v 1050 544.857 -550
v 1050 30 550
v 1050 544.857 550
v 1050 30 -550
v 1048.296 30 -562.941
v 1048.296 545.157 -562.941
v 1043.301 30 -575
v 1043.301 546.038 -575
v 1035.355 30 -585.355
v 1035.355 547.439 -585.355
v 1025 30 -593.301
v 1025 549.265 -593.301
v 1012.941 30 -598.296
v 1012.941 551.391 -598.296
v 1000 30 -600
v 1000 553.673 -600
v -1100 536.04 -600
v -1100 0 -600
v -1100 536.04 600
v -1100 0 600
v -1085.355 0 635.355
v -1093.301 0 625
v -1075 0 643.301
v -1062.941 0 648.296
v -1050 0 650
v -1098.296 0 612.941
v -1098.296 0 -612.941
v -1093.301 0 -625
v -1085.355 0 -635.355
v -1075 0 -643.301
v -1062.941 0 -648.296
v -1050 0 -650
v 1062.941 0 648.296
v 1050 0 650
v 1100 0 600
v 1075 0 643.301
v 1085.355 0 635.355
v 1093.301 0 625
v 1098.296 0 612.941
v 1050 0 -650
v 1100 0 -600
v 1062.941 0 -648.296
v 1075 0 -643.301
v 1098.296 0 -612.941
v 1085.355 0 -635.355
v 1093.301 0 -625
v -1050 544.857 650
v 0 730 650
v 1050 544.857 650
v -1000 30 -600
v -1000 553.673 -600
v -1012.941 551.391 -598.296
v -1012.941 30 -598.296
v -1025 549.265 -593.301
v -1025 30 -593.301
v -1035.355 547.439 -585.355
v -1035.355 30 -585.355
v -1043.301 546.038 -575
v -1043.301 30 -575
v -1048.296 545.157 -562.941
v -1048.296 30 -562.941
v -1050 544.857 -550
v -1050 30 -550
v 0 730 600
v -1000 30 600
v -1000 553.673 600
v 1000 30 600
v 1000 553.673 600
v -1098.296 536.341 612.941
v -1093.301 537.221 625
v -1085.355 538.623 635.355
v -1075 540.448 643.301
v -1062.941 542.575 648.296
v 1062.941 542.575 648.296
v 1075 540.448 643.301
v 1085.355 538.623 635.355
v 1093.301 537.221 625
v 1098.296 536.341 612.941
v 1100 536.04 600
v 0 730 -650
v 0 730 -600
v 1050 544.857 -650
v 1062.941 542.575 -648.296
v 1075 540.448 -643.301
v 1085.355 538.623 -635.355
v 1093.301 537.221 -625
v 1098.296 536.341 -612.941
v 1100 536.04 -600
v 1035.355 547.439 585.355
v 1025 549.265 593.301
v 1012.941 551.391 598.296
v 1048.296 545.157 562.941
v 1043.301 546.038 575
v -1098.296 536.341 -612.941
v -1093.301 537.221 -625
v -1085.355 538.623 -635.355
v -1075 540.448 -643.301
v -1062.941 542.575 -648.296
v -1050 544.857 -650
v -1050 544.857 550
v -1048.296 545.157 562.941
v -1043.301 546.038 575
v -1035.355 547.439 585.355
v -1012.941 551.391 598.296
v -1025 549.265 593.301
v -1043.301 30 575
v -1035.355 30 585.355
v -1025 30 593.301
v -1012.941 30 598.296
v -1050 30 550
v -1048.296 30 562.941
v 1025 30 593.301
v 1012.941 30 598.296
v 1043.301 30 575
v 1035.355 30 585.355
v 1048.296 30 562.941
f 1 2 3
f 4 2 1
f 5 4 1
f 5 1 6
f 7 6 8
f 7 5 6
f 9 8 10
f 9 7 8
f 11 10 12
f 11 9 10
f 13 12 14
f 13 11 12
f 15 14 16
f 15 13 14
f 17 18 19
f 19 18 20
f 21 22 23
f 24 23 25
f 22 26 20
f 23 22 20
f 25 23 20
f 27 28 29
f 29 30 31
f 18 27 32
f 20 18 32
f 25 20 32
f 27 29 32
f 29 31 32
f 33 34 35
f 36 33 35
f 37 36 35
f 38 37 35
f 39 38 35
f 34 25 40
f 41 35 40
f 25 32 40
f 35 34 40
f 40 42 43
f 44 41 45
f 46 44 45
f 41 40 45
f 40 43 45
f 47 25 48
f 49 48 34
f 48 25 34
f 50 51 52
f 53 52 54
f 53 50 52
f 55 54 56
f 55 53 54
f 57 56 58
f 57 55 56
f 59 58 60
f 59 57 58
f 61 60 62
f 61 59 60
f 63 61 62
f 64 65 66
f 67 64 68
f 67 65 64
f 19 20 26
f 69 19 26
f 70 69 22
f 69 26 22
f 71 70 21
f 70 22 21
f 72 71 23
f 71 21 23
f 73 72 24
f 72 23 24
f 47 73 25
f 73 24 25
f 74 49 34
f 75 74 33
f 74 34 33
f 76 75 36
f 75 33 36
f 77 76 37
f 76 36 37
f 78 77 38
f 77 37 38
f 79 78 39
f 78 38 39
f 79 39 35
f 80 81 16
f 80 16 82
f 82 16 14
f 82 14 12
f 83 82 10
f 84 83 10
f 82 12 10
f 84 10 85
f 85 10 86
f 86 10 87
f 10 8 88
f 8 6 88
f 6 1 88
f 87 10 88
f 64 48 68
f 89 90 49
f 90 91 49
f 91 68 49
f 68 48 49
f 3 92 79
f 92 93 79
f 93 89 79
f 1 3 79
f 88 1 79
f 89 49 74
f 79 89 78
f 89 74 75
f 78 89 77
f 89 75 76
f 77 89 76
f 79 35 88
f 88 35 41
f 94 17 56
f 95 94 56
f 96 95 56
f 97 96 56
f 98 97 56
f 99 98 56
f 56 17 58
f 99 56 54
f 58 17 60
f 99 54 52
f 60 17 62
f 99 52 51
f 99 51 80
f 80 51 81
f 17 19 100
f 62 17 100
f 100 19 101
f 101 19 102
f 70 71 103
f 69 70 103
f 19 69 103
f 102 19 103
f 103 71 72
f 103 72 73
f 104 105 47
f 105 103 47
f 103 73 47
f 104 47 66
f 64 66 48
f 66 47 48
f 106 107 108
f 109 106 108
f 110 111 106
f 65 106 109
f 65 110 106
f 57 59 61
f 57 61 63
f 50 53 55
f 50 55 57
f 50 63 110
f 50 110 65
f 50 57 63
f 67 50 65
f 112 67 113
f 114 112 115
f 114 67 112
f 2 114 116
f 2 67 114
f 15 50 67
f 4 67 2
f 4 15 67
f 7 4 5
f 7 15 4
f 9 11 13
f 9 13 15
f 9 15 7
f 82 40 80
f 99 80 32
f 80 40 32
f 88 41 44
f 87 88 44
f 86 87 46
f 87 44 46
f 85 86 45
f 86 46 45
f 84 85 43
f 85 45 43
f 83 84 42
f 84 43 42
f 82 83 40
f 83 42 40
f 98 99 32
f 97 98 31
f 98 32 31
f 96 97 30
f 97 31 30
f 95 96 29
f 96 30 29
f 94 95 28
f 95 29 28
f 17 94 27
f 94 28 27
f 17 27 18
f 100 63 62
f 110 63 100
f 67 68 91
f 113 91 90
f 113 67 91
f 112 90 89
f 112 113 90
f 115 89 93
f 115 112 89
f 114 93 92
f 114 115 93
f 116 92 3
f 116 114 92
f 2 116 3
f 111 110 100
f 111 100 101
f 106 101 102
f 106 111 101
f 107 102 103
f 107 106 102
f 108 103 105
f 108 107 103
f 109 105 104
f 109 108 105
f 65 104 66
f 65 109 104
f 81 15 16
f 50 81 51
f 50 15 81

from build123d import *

# Parameters (mm, degrees)
EXTRUDE_1_DEPTH     = 30
EXTRUDE_2_DEPTH     = 700
CUT_EXTRUDE_1_REACH = 1854.809


with BuildPart() as part:
    # Эскиз1 → Бобышка-Вытянуть1 (new body)
    with BuildSketch(Plane(origin=(0, 0, 0), x_dir=(1, 0, 0), z_dir=(0, 1, 0))):
        with BuildLine():
            Line((-1050, -650), (1050, -650))
            ThreePointArc((1050, -650), (1085.355339059, -635.355339059), (1100, -600))
            Line((1100, -600), (1100, 600))
            ThreePointArc((1100, 600), (1085.355339059, 635.355339059), (1050, 650))
            Line((1050, 650), (-1050, 650))
            ThreePointArc((-1050, 650), (-1085.355339059, 635.355339059), (-1100, 600))
            Line((-1100, 600), (-1100, -600))
            ThreePointArc((-1100, -600), (-1085.355339059, -635.355339059), (-1050, -650))
        make_face()
    extrude(amount=EXTRUDE_1_DEPTH)

    # Эскиз2 → Бобышка-Вытянуть2 (add)
    with BuildSketch(Plane(origin=(0, 30, 0), x_dir=(1, 0, 0), z_dir=(0, 1, 0))):
        with BuildLine():
            Line((-1050, -650), (1050, -650))
            ThreePointArc((1050, -650), (1085.355339059, -635.355339059), (1100, -600))
            Line((1100, -600), (1100, 600))
            ThreePointArc((1100, 600), (1085.355339059, 635.355339059), (1050, 650))
            Line((1050, 650), (-1050, 650))
            ThreePointArc((-1050, 650), (-1085.355339059, 635.355339059), (-1100, 600))
            Line((-1100, 600), (-1100, -600))
            ThreePointArc((-1100, -600), (-1085.355339059, -635.355339059), (-1050, -650))
        make_face()
        with BuildLine():
            Line((-1000, -600), (1000, -600))
            ThreePointArc((1000, -600), (1035.355339059, -585.355339059), (1050, -550))
            Line((1050, -550), (1050, 550))
            ThreePointArc((1050, 550), (1035.355339059, 585.355339059), (1000, 600))
            Line((1000, 600), (-1000, 600))
            ThreePointArc((-1000, 600), (-1035.355339059, 585.355339059), (-1050, 550))
            Line((-1050, 550), (-1050, -550))
            ThreePointArc((-1050, -550), (-1035.355339059, -585.355339059), (-1000, -600))
        make_face(mode=Mode.SUBTRACT)
    extrude(amount=EXTRUDE_2_DEPTH)

    # Эскиз3 → Вырез-Вытянуть1 (cut, up to next)
    with BuildSketch(Plane.XY.offset(650), mode=Mode.PRIVATE) as cut_extrude_1_sk1:
        Polygon((0, 730), (1300, 500.774925079), (1300, 730), (-1300, 730), (-1300, 500.774925079), align=None)
    cut_extrude_1_tool1 = extrude(cut_extrude_1_sk1.sketch, amount=-CUT_EXTRUDE_1_REACH, mode=Mode.PRIVATE) & part.part
    add(cut_extrude_1_tool1.solids().sort_by_distance((654.532365, 641.091783, 650))[0], mode=Mode.SUBTRACT)
    add(cut_extrude_1_tool1.solids().sort_by_distance((654.532365, 641.091783, 650))[1], mode=Mode.SUBTRACT)


solid = part.part
